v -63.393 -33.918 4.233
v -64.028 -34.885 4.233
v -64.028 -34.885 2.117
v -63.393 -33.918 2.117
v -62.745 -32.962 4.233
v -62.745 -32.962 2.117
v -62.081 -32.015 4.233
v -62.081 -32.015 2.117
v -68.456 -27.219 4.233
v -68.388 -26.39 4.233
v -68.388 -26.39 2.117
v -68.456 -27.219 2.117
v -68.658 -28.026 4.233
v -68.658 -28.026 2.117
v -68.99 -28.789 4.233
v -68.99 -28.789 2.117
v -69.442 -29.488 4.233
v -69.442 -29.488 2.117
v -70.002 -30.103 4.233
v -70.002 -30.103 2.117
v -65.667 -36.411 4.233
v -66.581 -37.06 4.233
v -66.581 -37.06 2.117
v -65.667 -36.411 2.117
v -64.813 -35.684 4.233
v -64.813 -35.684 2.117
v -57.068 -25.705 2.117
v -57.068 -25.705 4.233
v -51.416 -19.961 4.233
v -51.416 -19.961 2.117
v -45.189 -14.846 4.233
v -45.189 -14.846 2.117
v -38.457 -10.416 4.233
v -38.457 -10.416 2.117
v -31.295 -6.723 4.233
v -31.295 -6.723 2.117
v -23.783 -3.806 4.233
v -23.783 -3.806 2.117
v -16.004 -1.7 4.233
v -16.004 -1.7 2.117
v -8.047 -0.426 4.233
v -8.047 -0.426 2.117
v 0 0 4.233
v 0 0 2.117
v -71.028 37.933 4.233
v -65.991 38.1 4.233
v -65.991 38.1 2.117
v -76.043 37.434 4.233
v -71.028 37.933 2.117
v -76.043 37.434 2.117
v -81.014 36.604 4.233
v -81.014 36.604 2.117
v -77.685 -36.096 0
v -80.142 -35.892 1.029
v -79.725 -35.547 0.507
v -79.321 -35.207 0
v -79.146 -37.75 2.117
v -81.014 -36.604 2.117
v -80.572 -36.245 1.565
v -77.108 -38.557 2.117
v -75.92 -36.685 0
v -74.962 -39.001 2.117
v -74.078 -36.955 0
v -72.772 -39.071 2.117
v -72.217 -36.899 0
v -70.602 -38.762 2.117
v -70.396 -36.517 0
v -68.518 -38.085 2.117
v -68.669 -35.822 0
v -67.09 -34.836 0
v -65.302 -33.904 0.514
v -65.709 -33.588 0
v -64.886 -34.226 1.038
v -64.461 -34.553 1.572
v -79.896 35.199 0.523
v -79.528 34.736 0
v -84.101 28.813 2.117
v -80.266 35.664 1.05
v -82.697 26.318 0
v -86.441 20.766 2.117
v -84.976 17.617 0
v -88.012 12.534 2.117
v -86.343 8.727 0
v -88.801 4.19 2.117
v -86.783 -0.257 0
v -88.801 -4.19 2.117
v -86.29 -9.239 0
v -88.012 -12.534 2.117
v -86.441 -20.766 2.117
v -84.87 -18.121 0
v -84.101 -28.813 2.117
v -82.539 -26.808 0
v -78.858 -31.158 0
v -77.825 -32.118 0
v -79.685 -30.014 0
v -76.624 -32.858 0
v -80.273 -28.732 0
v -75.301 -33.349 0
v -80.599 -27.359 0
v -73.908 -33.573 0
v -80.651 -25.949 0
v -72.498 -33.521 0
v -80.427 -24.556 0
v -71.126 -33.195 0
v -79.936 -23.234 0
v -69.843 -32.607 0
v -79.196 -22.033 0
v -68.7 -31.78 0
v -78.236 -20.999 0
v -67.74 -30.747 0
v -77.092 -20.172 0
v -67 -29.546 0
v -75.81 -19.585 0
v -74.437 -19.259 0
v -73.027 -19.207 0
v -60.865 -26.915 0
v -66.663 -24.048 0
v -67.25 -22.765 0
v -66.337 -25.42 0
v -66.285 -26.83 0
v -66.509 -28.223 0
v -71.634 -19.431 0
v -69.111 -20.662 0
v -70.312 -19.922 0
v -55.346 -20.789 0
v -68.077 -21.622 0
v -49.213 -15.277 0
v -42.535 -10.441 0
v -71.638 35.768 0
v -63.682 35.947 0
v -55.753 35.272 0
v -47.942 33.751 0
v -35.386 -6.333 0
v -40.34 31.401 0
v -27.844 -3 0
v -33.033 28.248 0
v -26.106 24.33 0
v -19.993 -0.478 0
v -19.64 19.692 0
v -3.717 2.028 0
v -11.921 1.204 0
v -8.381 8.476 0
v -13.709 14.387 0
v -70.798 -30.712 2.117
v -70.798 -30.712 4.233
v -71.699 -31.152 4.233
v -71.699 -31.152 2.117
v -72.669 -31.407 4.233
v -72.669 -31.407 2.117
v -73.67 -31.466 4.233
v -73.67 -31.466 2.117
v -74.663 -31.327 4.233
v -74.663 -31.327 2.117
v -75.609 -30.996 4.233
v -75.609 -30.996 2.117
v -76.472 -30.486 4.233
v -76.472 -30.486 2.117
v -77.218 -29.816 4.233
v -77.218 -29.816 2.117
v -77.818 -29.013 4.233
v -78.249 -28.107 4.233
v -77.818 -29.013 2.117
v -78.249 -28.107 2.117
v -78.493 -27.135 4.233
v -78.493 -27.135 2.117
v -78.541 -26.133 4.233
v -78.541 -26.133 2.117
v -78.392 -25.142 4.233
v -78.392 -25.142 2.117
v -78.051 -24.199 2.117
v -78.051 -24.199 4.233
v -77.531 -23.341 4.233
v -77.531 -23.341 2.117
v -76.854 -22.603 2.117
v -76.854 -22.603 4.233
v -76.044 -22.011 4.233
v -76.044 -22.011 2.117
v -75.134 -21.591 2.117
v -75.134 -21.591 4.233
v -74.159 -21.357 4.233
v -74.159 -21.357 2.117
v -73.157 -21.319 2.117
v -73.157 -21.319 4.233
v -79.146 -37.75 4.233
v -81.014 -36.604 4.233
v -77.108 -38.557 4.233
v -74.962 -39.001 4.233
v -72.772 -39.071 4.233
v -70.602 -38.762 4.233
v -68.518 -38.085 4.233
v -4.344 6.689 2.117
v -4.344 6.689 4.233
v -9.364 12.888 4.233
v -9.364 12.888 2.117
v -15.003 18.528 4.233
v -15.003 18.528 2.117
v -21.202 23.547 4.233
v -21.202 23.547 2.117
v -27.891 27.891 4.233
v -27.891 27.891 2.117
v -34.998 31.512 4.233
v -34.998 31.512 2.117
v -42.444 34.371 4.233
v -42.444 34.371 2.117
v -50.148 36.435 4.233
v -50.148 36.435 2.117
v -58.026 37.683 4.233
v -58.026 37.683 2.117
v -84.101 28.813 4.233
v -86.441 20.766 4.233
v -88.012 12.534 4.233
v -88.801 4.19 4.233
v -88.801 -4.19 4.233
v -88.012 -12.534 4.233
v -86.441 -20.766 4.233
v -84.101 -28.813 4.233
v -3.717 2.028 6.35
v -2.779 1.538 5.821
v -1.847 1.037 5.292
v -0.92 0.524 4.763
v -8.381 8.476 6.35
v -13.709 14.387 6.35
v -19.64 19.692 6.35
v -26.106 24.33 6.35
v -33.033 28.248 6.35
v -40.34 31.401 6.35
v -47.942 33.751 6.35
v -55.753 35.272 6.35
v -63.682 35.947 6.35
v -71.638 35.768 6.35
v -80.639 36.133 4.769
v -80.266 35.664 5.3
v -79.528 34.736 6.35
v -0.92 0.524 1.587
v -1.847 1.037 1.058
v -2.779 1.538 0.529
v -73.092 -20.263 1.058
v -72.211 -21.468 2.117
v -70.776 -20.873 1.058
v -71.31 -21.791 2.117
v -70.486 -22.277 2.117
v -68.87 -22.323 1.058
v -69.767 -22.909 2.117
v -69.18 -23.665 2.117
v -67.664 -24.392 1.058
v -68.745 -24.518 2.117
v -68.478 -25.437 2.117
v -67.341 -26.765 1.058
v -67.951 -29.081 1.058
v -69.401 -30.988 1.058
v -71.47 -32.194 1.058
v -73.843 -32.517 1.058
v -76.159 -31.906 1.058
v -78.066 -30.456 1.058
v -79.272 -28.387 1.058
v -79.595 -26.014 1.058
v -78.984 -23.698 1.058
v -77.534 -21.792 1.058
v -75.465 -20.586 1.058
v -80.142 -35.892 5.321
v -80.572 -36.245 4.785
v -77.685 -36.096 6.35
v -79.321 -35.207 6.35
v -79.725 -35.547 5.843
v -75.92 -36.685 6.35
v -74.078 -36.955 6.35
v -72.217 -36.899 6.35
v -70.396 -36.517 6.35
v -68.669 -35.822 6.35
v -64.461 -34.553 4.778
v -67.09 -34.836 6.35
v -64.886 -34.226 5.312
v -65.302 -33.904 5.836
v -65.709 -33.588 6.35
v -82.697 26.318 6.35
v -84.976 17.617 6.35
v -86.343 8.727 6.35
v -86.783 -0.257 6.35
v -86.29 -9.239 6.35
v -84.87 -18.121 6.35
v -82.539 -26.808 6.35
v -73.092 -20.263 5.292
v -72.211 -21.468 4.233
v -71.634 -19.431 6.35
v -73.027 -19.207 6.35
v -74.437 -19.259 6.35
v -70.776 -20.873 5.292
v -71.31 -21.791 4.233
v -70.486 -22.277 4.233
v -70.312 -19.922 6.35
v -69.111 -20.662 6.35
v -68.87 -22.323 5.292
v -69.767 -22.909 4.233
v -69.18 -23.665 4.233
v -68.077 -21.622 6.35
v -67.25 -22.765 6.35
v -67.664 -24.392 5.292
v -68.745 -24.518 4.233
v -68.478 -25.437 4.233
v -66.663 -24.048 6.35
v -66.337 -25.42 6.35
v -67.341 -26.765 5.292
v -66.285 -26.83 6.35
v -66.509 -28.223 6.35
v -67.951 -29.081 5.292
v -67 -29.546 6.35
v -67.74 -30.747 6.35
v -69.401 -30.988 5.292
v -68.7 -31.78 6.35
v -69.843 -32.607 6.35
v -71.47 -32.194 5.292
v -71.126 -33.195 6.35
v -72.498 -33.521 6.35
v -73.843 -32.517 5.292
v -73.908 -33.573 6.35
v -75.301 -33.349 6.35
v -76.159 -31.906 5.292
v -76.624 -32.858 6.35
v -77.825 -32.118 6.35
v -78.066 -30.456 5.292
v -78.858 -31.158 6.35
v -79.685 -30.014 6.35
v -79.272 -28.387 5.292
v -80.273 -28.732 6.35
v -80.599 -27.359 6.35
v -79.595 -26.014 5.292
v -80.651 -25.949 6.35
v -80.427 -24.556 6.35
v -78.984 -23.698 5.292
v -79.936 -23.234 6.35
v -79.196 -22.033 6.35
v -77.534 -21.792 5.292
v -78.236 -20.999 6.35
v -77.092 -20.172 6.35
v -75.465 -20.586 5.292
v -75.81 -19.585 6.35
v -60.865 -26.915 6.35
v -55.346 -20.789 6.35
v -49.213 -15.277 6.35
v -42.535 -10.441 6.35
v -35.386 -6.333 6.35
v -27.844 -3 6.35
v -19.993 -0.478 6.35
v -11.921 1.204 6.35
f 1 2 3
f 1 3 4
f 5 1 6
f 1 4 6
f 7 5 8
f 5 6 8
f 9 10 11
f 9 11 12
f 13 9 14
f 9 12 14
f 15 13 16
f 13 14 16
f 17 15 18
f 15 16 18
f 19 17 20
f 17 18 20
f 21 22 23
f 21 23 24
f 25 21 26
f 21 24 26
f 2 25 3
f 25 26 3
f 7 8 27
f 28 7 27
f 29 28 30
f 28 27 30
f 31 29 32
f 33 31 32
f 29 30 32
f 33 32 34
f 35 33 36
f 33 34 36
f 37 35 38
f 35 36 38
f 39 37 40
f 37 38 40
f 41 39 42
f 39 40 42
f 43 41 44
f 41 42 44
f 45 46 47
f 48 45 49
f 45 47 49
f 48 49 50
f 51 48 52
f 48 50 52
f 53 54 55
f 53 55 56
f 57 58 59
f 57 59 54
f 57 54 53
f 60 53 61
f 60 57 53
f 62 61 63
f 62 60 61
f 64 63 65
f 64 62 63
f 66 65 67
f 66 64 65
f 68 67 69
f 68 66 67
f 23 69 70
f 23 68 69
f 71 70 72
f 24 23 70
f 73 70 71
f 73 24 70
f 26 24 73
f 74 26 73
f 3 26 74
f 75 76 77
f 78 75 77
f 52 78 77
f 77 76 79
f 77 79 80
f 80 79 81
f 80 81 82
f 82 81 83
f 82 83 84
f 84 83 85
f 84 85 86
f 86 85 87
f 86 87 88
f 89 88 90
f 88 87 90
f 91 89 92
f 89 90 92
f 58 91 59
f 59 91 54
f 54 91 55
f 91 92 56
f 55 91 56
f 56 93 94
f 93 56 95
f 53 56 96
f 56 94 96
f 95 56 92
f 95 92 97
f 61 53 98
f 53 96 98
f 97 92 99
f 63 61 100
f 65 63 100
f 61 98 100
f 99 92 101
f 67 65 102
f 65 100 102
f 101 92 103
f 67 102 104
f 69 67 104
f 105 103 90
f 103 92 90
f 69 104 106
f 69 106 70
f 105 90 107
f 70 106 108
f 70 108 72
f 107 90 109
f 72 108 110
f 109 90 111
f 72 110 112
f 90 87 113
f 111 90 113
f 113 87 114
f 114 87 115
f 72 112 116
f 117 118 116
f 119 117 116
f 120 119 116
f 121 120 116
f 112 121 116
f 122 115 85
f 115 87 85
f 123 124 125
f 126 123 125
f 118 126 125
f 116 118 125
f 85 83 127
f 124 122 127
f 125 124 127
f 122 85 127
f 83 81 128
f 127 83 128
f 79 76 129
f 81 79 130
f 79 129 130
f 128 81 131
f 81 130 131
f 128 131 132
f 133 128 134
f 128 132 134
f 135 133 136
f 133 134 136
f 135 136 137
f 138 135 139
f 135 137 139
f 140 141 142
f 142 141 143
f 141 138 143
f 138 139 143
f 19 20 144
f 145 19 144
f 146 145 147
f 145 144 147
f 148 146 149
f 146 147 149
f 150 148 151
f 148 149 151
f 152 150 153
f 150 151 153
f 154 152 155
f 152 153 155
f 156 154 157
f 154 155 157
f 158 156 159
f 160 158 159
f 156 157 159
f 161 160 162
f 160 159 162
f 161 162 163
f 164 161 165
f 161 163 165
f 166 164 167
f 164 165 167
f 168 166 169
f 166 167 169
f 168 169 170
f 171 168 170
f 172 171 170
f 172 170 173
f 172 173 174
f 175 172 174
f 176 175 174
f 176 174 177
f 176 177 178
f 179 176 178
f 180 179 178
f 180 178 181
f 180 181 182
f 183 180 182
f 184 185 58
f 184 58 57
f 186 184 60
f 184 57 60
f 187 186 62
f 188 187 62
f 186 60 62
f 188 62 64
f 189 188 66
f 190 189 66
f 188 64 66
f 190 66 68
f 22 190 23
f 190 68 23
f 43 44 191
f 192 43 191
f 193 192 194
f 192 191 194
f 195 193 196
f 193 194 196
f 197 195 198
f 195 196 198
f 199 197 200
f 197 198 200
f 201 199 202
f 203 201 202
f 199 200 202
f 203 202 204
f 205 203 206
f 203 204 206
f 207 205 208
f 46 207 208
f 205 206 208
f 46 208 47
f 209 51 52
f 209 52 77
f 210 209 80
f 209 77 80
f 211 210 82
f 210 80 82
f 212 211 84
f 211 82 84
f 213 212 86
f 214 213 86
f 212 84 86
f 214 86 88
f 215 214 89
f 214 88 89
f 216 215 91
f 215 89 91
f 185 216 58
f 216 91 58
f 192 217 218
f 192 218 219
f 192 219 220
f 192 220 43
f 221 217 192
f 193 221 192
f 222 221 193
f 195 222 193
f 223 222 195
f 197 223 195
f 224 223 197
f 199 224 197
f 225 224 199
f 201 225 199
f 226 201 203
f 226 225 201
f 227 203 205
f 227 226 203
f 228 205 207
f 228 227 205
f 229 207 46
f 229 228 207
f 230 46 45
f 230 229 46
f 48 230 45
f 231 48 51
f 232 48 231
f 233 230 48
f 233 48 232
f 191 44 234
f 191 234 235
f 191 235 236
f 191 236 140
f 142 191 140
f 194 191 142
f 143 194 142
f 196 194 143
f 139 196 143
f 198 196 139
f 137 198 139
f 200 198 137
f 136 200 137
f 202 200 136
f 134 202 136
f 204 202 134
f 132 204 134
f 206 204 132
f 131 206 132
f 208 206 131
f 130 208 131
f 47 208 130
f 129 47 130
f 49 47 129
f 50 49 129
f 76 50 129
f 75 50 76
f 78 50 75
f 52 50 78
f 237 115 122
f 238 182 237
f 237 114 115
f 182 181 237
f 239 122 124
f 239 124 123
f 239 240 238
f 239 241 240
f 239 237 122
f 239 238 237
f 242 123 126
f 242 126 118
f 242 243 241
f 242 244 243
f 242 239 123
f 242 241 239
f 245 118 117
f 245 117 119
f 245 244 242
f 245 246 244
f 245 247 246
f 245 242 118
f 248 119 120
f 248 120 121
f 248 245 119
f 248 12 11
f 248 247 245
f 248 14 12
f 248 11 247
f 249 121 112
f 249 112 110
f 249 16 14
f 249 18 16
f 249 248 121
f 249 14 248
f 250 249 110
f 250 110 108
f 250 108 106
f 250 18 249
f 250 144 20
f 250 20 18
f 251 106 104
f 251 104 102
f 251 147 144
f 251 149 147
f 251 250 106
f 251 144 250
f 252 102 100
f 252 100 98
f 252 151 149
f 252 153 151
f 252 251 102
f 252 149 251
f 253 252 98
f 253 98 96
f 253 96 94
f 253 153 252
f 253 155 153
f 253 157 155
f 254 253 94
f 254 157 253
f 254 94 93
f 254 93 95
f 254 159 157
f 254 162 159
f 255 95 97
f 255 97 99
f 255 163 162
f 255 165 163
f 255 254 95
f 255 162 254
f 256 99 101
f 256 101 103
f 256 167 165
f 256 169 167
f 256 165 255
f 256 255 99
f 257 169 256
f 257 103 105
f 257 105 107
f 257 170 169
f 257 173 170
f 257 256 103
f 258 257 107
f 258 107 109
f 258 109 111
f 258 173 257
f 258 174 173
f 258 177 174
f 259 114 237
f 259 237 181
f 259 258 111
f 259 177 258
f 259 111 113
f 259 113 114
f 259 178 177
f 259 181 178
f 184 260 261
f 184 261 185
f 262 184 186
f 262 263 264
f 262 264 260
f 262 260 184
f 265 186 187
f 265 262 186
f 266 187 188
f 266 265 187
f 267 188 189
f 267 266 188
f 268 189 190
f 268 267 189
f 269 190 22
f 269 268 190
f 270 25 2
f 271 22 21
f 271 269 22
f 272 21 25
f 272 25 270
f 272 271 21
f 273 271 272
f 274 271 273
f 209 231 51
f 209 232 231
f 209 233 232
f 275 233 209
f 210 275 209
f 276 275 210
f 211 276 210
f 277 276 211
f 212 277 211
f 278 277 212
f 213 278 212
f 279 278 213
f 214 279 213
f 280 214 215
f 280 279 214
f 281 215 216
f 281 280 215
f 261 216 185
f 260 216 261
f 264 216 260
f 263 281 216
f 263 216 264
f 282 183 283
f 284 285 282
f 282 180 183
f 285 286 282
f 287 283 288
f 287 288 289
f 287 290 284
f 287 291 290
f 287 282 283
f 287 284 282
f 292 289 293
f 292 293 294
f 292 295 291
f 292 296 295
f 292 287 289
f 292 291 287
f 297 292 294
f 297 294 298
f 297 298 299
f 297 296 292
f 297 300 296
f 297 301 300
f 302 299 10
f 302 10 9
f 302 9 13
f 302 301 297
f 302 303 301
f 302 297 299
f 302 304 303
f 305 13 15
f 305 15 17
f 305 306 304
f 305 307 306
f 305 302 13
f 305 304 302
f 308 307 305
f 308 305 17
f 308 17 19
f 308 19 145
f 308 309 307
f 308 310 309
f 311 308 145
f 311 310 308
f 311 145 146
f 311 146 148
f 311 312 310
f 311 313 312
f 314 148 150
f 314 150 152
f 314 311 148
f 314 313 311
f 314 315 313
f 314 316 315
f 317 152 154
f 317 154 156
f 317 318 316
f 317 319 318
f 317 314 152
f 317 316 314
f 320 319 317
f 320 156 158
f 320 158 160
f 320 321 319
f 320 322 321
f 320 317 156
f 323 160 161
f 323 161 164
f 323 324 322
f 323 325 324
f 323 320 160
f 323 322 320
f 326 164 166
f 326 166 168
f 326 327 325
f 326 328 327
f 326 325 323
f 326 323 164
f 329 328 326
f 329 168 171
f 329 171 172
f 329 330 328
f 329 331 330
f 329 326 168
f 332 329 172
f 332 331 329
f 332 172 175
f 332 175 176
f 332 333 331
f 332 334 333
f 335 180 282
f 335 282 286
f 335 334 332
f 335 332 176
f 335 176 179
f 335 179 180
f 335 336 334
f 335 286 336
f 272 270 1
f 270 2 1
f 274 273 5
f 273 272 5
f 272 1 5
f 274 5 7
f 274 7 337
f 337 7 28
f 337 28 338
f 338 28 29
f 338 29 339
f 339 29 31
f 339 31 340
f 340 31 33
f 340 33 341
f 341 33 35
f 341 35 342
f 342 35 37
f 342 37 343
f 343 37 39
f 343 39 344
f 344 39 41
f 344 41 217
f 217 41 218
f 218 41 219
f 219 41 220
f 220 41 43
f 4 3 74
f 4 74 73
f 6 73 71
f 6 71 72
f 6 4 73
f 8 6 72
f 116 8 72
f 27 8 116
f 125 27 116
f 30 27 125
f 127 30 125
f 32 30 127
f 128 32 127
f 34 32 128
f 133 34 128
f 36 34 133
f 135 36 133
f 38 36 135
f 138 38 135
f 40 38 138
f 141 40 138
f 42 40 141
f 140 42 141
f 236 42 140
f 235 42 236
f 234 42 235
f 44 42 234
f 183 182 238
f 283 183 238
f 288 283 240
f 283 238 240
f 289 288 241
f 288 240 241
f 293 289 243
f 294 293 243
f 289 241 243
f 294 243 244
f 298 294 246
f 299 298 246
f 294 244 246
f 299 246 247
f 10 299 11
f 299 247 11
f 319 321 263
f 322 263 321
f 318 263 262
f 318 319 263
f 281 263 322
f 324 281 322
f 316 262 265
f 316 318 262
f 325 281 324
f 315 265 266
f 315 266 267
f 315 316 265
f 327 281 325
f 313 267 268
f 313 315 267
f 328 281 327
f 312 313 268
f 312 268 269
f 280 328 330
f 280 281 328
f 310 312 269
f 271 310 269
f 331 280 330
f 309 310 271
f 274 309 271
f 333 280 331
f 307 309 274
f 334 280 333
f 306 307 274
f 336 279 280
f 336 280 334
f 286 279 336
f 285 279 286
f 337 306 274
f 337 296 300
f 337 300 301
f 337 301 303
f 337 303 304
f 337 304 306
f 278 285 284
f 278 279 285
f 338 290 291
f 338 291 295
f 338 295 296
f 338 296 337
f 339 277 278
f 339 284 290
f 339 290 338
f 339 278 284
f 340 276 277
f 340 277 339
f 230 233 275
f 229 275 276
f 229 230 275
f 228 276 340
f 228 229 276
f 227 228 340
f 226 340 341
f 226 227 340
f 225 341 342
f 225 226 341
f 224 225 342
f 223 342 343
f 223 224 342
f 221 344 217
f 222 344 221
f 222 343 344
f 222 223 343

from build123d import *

# Parameters (mm, degrees)
F2_DEPTH     = 6.35
F3_T6_ANGLE  = 79.5586583167
F3_T8_ANGLE  = 79.5586583167
F3_T10_ANGLE = 63.5249338853
F3_T12_ANGLE = 63.5249338853
F3_T14_ANGLE = 109.1774772549
F3_T16_ANGLE = 109.1774772549
F3_T18_ANGLE = 50.5483837844
F3_T20_ANGLE = 50.5483837844


# Not quite as in the source:
# - a fillet or chamfer that OpenCascade refuses, or shapes differently, is made with other operations: its cross-section is extruded or revolved along the edge and cut away or added


with BuildPart() as f2:
    # F1 (on Top) → F2 (new body)
    with BuildSketch(Plane.XY):
        with BuildLine():
            ThreePointArc((-73.1568782646, -21.3192674026), (-75.6518657205, 9.1233334372), (-65.9911357684, 38.1))
            ThreePointArc((-65.9911357684, 38.1), (-73.5398929218, 37.7251690762), (-81.0143847835, 36.6043639223))
            ThreePointArc((-81.0143847835, 36.6043639223), (-88.9, 0), (-81.0143847835, -36.6043639223))
            ThreePointArc((-81.0143847835, -36.6043639223), (-73.8686107341, -39.0834183952), (-66.5806584514, -37.0601662189))
            ThreePointArc((-66.5806584514, -37.0601662189), (-68.3796387065, -33.6253626057), (-70.0015683829, -30.1034952113))
            ThreePointArc((-70.0015683829, -30.1034952113), (-78.2486807064, -28.1070619795), (-73.1568782646, -21.3192674026))
        make_face()
        with BuildLine():
            ThreePointArc((0, 0), (-27.8911357684, 27.8911357684), (-65.9911357684, 38.1))
            ThreePointArc((-65.9911357684, 38.1), (-75.6518657205, 9.1233334372), (-73.1568782646, -21.3192674026))
            ThreePointArc((-73.1568782646, -21.3192674026), (-69.7673746876, -22.9092911449), (-68.3877575616, -26.3897460844))
            ThreePointArc((-68.3877575616, -26.3897460844), (-68.8086460032, -28.4143644401), (-70.0015683829, -30.1034952113))
            ThreePointArc((-70.0015683829, -30.1034952113), (-68.3796387065, -33.6253626057), (-66.5806584514, -37.0601662189))
            ThreePointArc((-66.5806584514, -37.0601662189), (-65.2319724125, -36.0573126333), (-64.0275195551, -34.8851511001))
            ThreePointArc((-64.0275195551, -34.8851511001), (-63.0707476834, -33.4387934378), (-62.0813092162, -32.0145833333))
            ThreePointArc((-62.0813092162, -32.0145833333), (-34.925, -8.4749354005), (0, 0))
        make_face()
    extrude(amount=F2_DEPTH)

    # F3: chamfer of 2.1166666667 on 10 edges, made by hand

    # F3_s1 → F3_t2 (revolve, cut)
    with BuildSketch(Plane(origin=(-71.580679249, 4.3887278976, 0), x_dir=(0, 0, 1), z_dir=(-0.9981257248, 0.061196712, 0))):
        Polygon((4.2333333333, -25.7562696385), (6.35, -23.6396029718), (6.35, -25.7562696385), align=None)
    revolve(axis=Axis((-73.4677575616, -26.3897460844, 6.35), (0, 0, -1)), mode=Mode.SUBTRACT)

    # F3_s3 → F3_t4 (revolve, cut)
    with BuildSketch(Plane(origin=(-71.580679249, 4.3887278976, 0), x_dir=(0, 0, 1), z_dir=(-0.9981257248, 0.061196712, 0))):
        Polygon((0, -23.6396029718), (2.1166666667, -25.7562696385), (0, -25.7562696385), align=None)
    revolve(axis=Axis((-73.4677575616, -26.3897460844, 0), (0, 0, -1)), mode=Mode.SUBTRACT)

    # F3_s5 → F3_t6 (revolve, cut)
    with BuildSketch(Plane(origin=(2.3767752158, -4.8934699303, 0), x_dir=(0, 0, 1), z_dir=(0.4368960746, -0.8995119899, 0))):
        Polygon((4.2333333333, -0.1944417058), (6.35, 1.9222249609), (6.35, -0.1944417058), align=None)
    revolve(axis=Axis((-65.9911357684, -38.1, 6.35), (0, 0, 1)), revolution_arc=F3_T6_ANGLE, mode=Mode.SUBTRACT)

    # F3_s7 → F3_t8 (revolve, cut)
    with BuildSketch(Plane(origin=(2.3767752158, -4.8934699303, 0), x_dir=(0, 0, 1), z_dir=(0.4368960746, -0.8995119899, 0))):
        Polygon((0, 1.9222249609), (2.1166666667, -0.1944417058), (0, -0.1944417058), align=None)
    revolve(axis=Axis((-65.9911357684, -38.1, 0), (0, 0, 1)), revolution_arc=F3_T8_ANGLE, mode=Mode.SUBTRACT)

    # F3_s9 → F3_t10 (revolve, cut)
    with BuildSketch(Plane(origin=(-32.1255217702, -58.583184591, 0), x_dir=(0, 0, 1), z_dir=(-0.4808240877, -0.8768170828, 0))):
        Polygon((6.35, 41.6778711875), (4.2333333333, 39.5612045208), (6.35, 39.5612045208), align=None)
    revolve(axis=Axis((0, -76.2, 6.35), (0, 0, -1)), revolution_arc=F3_T10_ANGLE, mode=Mode.SUBTRACT)

    # F3_s11 → F3_t12 (revolve, cut)
    with BuildSketch(Plane(origin=(-32.1255217702, -58.583184591, 0), x_dir=(0, 0, 1), z_dir=(-0.4808240877, -0.8768170828, 0))):
        Polygon((0, 41.6778711875), (2.1166666667, 39.5612045208), (0, 39.5612045208), align=None)
    revolve(axis=Axis((0, -76.2, 0), (0, 0, -1)), revolution_arc=F3_T12_ANGLE, mode=Mode.SUBTRACT)

    # F3_s13 → F3_t14 (revolve, cut)
    with BuildSketch(Plane(origin=(-6.0616572407, 10.9442518524, 0), x_dir=(0, 0, 1), z_dir=(-0.484513618, 0.8747837184, 0))):
        Polygon((4.2333333333, -89.7545894961), (6.35, -87.6379228294), (6.35, -89.7545894961), align=None)
    revolve(axis=Axis((-73.4677575616, -26.3897460844, 6.35), (0, 0, 1)), revolution_arc=F3_T14_ANGLE, mode=Mode.SUBTRACT)

    # F3_s15 → F3_t16 (revolve, cut)
    with BuildSketch(Plane(origin=(-6.0616572407, 10.9442518524, 0), x_dir=(0, 0, 1), z_dir=(-0.484513618, 0.8747837184, 0))):
        Polygon((0, -87.6379228294), (2.1166666667, -89.7545894961), (0, -89.7545894961), align=None)
    revolve(axis=Axis((-73.4677575616, -26.3897460844, 0), (0, 0, 1)), revolution_arc=F3_T16_ANGLE, mode=Mode.SUBTRACT)

    # F3_s17 → F3_t18 (revolve, cut)
    with BuildSketch(Plane(origin=(0, 0, 0), x_dir=(0, 0, 1), z_dir=(0.4407105264, 0.8976492811, 0))):
        Polygon((4.2333333333, -88.9), (6.35, -86.7833333333), (6.35, -88.9), align=None)
    revolve(axis=Axis((0, 0, 6.35), (0, 0, 1)), revolution_arc=F3_T18_ANGLE, mode=Mode.SUBTRACT)

    # F3_s19 → F3_t20 (revolve, cut)
    with BuildSketch(Plane(origin=(0, 0, 0), x_dir=(0, 0, 1), z_dir=(0.4407105264, 0.8976492811, 0))):
        Polygon((2.1166666667, -88.9), (0, -86.7833333333), (0, -88.9), align=None)
    revolve(axis=Axis((0, 0, 0), (0, 0, 1)), revolution_arc=F3_T20_ANGLE, mode=Mode.SUBTRACT)


solid = f2.part
